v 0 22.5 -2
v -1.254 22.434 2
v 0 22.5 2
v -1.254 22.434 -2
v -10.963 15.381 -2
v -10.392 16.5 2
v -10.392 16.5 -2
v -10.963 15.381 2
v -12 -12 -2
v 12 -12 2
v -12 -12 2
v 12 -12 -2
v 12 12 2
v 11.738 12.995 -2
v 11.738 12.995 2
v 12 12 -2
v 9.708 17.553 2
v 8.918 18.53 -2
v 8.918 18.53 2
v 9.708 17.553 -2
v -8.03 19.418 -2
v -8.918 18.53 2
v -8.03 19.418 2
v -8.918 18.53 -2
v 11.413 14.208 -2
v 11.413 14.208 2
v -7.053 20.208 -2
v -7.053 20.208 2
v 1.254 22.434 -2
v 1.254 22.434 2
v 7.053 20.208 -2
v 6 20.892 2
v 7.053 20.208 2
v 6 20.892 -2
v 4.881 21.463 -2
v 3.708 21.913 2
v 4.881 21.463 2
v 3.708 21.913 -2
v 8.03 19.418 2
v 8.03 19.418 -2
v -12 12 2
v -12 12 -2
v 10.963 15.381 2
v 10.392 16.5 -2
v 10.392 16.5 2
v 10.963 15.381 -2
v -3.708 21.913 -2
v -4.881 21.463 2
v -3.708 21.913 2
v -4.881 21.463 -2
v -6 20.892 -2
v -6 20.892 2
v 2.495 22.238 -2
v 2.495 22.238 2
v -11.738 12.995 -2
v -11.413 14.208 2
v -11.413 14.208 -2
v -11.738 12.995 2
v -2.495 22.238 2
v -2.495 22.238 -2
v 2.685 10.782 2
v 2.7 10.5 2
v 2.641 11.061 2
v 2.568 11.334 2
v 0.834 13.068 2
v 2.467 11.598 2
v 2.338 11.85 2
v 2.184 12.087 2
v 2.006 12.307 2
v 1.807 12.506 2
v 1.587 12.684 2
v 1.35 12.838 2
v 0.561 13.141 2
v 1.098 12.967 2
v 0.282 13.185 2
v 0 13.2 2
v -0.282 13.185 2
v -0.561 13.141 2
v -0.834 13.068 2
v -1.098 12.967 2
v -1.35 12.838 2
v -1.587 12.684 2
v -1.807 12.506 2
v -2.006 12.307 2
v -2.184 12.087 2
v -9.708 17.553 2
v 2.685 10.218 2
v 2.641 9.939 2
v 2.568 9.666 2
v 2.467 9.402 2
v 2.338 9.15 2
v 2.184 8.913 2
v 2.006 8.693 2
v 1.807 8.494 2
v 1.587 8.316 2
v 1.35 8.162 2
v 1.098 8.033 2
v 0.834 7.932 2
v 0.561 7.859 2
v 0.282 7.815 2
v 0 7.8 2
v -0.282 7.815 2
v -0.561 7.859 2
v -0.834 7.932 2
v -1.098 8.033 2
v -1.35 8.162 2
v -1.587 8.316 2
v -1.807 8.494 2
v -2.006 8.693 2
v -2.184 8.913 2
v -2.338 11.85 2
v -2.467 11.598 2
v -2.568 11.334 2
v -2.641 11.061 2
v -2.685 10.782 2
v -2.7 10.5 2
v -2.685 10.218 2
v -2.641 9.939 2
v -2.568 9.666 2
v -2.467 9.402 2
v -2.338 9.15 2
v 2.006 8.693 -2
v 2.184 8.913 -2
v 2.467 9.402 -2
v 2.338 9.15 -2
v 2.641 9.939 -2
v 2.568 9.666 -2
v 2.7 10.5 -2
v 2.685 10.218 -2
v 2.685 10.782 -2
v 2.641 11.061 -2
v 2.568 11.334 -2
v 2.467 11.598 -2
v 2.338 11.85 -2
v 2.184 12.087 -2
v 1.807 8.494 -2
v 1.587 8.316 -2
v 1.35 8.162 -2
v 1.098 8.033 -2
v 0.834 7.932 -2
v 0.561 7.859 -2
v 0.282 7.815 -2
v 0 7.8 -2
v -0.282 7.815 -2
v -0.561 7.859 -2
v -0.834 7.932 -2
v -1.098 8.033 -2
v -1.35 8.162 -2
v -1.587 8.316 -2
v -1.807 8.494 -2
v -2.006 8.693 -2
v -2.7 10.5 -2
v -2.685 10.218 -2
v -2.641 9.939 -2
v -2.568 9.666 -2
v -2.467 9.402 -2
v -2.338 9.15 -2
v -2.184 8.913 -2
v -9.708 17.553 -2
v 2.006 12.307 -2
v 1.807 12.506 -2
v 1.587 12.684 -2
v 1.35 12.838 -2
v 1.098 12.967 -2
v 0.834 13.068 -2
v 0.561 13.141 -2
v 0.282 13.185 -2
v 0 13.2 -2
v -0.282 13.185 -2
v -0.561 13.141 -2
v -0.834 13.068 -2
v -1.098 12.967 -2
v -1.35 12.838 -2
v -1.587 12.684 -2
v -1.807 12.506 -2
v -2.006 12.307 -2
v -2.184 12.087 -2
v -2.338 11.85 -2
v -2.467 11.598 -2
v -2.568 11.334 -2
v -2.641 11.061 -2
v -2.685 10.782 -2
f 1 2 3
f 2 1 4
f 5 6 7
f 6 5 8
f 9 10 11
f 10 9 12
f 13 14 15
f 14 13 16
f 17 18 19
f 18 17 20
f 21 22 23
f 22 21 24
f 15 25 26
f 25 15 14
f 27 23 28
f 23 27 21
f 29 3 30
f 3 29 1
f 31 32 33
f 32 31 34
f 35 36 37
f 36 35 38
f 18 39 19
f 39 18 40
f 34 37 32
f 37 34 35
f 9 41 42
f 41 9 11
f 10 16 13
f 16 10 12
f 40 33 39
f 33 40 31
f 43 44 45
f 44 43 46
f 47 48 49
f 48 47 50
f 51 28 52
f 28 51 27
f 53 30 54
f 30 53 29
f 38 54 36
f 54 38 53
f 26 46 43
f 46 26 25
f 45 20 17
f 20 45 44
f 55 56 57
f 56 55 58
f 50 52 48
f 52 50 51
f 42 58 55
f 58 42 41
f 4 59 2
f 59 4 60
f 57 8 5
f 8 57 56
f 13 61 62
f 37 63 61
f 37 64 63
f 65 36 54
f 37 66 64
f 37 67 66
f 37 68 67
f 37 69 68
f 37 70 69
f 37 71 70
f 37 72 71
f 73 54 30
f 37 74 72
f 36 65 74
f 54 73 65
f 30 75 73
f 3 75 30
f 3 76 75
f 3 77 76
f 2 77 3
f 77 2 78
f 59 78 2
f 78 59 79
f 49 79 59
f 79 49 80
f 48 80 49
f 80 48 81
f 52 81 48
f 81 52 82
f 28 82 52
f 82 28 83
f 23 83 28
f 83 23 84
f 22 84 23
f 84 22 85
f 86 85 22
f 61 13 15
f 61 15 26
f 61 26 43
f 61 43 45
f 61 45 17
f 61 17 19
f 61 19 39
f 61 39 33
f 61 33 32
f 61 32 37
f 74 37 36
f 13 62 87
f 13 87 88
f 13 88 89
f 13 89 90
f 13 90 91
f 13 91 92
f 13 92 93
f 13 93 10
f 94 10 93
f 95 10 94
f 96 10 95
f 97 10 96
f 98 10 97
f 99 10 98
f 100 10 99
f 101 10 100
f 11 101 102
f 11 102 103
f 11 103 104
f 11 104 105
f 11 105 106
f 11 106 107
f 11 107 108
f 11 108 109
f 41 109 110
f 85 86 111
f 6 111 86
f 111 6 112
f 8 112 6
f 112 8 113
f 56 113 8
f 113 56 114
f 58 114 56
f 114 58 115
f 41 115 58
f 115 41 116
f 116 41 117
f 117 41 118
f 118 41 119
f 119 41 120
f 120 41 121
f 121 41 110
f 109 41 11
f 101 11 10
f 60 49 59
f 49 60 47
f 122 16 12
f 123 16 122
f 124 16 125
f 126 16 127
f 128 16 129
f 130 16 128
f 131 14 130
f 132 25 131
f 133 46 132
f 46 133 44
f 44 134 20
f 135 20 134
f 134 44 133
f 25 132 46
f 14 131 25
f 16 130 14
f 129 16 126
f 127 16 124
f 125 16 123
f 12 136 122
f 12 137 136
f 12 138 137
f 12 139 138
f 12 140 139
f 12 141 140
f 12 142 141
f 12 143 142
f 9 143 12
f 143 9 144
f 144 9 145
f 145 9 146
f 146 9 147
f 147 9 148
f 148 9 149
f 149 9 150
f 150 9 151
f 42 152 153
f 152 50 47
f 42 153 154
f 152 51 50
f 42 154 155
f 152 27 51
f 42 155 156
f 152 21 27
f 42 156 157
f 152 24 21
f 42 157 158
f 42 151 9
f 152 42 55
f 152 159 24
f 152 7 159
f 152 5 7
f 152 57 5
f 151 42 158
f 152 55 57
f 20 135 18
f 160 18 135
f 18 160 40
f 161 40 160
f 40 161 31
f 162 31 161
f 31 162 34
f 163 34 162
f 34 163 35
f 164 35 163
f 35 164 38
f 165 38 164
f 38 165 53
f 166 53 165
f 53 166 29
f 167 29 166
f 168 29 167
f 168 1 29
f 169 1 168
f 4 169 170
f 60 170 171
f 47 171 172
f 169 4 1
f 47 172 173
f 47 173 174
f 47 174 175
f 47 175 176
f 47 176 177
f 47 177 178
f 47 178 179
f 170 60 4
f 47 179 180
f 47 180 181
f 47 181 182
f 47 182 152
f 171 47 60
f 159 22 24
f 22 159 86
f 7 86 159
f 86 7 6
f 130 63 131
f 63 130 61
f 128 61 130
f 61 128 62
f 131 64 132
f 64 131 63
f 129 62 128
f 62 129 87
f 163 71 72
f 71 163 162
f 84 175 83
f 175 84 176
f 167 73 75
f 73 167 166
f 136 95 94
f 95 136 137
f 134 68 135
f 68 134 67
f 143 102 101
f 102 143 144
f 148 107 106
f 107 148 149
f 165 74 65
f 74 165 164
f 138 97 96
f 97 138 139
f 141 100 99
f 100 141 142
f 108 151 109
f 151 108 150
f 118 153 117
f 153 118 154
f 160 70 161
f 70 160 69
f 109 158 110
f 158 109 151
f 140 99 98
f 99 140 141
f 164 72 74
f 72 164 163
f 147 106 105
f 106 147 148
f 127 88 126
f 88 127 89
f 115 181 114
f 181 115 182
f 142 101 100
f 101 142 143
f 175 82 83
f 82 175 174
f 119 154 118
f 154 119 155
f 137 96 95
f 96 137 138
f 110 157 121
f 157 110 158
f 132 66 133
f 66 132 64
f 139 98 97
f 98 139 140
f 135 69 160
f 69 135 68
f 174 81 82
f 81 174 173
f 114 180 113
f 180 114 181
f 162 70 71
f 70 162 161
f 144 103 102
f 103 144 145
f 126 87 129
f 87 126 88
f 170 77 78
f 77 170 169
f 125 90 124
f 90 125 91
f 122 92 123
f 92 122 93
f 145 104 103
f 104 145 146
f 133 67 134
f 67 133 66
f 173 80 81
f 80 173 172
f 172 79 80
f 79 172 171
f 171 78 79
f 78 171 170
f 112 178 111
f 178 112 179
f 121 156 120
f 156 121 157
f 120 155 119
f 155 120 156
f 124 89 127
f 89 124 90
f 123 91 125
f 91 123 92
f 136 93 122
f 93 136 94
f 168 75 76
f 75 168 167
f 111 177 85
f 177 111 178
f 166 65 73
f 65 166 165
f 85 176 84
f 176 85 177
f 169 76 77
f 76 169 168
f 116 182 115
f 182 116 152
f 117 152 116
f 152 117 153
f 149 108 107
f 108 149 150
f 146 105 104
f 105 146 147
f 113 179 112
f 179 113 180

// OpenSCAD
// Single-hole mounting tab.
$fn = 60;
eps = 0.02;
tab_w = 24;
tab_h = 45;
tab_t = 4;
difference() {
    hull() { translate([0,0,0]) cube([tab_w,tab_w,tab_t],center=true); translate([0,tab_h/2-tab_w/2,0]) cylinder(d=tab_w,h=tab_t,center=true); }
    translate([0,tab_h/2-tab_w/2,-tab_t/2-eps]) cylinder(d=5.4,h=tab_t+2*eps);
}
